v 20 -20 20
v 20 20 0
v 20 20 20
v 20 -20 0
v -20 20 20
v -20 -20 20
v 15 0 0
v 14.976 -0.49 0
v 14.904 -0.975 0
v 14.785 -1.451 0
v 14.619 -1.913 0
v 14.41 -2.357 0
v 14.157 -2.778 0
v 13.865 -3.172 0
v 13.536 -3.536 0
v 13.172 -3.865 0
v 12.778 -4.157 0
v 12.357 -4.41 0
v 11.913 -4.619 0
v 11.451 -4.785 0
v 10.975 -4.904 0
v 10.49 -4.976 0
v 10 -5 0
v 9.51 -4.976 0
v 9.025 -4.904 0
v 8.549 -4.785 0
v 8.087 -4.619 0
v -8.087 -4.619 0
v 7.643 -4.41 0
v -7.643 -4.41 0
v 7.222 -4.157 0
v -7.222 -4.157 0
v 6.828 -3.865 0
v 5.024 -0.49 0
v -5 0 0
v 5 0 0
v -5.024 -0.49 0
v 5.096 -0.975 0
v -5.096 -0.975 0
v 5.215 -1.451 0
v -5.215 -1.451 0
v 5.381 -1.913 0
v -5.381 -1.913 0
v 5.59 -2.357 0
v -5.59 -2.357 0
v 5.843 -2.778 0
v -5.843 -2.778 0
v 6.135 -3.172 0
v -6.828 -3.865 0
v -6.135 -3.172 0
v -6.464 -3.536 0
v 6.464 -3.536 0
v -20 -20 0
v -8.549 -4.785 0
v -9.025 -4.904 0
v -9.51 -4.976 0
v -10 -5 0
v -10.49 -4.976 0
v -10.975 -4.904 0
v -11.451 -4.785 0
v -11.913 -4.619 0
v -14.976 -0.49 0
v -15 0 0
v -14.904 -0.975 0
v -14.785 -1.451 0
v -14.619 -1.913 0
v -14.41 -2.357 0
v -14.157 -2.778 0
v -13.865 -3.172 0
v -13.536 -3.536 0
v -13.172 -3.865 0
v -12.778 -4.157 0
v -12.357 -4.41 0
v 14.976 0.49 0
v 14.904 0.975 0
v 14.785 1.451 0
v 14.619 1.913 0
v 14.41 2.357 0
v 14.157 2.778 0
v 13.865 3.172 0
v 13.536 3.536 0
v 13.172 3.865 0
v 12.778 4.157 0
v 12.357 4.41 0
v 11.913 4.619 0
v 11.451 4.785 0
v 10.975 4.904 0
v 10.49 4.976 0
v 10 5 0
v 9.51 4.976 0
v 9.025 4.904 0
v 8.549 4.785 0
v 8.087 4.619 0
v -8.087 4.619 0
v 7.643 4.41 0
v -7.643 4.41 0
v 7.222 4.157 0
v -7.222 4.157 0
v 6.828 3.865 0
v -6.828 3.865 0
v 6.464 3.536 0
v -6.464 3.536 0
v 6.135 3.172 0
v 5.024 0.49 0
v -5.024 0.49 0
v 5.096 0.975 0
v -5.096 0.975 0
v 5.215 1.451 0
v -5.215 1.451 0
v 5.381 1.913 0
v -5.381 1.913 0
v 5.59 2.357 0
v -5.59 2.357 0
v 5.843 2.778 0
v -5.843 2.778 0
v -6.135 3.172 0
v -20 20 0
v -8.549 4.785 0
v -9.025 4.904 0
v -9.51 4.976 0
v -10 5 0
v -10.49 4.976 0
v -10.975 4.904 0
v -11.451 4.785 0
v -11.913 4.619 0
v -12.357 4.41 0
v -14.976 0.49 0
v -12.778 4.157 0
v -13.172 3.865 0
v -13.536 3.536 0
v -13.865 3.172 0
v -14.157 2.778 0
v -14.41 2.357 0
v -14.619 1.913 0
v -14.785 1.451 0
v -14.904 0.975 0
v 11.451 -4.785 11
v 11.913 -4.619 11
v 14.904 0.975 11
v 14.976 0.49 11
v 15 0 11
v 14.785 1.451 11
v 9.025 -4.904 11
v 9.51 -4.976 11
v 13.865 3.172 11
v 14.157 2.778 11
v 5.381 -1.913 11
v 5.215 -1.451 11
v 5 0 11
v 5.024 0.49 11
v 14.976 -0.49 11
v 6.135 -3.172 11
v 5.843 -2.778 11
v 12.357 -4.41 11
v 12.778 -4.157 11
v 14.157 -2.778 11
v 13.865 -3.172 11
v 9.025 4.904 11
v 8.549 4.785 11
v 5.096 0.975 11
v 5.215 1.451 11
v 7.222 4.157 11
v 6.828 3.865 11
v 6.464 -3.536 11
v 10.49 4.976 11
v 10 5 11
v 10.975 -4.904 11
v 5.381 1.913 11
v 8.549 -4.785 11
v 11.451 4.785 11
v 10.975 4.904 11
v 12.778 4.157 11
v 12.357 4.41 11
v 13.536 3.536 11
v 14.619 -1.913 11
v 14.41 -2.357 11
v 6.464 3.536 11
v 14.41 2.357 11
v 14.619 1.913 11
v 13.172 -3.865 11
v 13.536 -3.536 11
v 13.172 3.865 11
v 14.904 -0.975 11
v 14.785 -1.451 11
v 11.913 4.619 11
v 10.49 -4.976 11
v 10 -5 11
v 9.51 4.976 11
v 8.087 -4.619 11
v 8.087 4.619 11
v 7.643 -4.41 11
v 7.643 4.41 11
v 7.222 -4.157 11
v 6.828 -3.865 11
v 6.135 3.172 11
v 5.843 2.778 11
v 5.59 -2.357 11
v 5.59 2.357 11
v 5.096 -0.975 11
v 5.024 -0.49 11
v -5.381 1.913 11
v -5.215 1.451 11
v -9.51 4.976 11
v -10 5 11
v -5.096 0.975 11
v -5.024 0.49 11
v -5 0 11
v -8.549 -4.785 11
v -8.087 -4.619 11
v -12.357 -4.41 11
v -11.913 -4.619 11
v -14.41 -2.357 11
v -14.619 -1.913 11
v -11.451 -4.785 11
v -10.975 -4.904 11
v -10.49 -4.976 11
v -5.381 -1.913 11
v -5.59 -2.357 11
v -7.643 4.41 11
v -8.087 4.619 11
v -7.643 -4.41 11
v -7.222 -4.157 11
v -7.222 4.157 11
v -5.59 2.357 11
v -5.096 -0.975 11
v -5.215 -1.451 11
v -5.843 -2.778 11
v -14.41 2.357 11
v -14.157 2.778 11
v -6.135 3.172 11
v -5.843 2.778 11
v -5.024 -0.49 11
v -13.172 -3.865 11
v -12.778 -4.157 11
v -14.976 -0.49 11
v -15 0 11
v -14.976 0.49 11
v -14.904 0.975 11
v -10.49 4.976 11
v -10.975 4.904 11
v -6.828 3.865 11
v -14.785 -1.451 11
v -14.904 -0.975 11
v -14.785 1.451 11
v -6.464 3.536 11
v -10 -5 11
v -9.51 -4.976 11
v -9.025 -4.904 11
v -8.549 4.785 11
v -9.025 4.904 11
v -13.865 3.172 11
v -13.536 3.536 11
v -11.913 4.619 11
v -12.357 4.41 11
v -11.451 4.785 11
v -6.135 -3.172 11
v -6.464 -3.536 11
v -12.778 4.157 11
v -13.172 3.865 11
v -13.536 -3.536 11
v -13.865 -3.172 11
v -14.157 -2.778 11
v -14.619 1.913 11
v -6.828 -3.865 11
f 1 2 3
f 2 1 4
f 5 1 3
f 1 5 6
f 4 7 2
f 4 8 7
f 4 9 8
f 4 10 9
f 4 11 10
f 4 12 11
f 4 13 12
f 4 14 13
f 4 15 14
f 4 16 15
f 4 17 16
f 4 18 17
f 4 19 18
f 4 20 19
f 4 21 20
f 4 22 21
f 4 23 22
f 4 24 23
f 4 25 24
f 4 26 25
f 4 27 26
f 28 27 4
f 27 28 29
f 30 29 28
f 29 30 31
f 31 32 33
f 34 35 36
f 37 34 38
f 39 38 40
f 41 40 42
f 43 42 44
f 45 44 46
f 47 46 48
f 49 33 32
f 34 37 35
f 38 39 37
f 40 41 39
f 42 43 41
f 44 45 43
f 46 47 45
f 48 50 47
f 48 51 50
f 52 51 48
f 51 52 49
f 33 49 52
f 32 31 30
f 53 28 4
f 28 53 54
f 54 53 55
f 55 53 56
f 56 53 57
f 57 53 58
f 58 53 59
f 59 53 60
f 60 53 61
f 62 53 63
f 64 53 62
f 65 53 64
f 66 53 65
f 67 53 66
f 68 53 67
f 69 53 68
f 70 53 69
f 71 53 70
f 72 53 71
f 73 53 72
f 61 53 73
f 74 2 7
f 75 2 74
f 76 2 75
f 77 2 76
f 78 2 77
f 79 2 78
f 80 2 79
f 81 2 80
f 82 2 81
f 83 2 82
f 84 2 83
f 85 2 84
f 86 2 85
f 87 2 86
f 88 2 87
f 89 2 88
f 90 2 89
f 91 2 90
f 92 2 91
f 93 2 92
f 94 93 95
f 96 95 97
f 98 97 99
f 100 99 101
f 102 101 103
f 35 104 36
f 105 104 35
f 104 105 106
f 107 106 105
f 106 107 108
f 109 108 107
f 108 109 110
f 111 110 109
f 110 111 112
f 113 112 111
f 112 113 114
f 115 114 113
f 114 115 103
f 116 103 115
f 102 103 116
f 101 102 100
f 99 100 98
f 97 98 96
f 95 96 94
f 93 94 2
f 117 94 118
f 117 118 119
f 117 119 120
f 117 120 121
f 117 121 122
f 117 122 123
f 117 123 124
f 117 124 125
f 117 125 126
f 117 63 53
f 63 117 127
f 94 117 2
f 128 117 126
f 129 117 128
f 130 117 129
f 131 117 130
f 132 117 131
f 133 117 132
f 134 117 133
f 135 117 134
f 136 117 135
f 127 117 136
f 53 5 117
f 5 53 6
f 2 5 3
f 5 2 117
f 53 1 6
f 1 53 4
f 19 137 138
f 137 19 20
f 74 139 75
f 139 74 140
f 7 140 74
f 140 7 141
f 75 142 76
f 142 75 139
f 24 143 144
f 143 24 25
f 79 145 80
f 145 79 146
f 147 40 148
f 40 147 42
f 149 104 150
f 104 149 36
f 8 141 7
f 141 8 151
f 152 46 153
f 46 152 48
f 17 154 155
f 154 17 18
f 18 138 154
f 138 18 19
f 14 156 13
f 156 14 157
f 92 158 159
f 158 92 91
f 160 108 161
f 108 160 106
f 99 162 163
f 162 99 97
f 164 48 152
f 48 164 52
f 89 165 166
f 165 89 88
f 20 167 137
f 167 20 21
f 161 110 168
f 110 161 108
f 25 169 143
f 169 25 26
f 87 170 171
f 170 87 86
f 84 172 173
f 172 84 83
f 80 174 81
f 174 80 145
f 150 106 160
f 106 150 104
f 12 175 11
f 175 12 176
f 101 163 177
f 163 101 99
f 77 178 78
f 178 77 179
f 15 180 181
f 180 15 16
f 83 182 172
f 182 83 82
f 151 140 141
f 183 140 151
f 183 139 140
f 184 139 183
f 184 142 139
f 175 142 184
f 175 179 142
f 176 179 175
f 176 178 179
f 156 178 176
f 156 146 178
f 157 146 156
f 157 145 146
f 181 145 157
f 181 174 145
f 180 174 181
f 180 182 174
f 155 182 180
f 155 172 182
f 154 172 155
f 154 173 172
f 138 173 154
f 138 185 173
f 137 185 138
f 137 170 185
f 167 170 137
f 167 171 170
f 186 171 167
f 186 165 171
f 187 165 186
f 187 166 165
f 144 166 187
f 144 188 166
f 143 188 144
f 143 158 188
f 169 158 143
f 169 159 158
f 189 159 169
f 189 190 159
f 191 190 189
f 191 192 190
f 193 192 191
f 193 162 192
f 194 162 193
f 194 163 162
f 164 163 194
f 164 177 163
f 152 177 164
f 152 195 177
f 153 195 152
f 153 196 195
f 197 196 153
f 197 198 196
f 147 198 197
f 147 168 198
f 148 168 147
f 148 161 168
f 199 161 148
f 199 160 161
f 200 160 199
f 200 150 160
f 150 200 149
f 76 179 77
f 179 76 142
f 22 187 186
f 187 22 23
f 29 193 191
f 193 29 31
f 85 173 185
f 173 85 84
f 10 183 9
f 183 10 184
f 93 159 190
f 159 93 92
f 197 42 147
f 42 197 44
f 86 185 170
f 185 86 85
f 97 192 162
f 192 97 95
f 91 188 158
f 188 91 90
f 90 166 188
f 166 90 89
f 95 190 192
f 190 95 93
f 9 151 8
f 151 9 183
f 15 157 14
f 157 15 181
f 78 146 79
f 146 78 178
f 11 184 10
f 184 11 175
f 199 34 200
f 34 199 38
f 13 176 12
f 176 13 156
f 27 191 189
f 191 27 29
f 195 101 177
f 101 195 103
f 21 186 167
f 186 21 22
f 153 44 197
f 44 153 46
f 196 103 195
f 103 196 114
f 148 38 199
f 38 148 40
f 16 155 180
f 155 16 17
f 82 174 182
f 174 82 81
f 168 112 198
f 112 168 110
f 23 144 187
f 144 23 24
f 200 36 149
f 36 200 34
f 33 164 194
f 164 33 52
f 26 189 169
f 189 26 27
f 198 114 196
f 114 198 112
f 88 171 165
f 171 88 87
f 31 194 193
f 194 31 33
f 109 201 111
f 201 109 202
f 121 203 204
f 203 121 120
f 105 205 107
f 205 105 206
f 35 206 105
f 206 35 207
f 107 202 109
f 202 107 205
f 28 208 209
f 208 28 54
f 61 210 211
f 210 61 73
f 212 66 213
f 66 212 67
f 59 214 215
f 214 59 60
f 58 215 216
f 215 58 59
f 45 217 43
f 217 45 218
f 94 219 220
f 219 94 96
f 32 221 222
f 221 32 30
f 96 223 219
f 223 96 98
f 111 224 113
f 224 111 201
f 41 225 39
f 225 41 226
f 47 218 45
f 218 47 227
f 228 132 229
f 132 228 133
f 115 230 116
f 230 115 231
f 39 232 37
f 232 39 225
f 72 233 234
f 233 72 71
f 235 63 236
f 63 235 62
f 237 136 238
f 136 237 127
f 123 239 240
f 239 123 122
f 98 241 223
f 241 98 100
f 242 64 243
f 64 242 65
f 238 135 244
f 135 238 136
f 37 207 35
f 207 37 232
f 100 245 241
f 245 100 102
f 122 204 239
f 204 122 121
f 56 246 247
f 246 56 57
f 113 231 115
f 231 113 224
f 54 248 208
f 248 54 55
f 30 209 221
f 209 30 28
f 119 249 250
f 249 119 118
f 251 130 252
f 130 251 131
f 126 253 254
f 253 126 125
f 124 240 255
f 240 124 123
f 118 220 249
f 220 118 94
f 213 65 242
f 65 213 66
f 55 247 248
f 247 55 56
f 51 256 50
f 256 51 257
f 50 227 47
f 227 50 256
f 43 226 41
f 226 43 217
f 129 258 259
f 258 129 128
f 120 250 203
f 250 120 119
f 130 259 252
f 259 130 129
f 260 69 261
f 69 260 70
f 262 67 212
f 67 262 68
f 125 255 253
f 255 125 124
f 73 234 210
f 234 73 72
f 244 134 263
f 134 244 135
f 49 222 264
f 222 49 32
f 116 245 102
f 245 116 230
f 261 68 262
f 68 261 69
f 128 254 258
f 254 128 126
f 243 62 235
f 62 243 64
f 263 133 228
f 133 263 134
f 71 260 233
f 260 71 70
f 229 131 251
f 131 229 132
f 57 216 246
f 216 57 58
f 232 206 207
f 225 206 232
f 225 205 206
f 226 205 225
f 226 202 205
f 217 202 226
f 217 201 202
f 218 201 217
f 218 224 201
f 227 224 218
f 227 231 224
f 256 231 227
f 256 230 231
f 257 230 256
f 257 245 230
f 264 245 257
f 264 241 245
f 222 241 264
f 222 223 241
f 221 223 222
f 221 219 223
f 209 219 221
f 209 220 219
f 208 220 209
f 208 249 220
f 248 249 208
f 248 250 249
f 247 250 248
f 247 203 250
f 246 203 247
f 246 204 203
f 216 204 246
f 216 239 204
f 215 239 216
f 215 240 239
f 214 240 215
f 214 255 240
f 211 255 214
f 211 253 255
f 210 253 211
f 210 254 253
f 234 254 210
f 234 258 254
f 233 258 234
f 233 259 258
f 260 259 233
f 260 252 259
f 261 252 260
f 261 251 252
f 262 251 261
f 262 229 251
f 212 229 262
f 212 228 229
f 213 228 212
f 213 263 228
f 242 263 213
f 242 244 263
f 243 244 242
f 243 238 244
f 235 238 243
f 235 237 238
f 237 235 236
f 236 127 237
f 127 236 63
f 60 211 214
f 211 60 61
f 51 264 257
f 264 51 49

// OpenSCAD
// Generated by scadwright. Do not hand-edit —
// edit the Python source and regenerate.

$fn = 64;

difference() {
    translate([-20, -20, 0]) {
        cube([40, 40, 20], center=false);
    }
    translate([10, 0, 0]) {
        cylinder(h=22, r=5, center=true);
    }
    translate([-10, 0, 0]) {
        cylinder(h=22, r=5, center=true);
    }
}
